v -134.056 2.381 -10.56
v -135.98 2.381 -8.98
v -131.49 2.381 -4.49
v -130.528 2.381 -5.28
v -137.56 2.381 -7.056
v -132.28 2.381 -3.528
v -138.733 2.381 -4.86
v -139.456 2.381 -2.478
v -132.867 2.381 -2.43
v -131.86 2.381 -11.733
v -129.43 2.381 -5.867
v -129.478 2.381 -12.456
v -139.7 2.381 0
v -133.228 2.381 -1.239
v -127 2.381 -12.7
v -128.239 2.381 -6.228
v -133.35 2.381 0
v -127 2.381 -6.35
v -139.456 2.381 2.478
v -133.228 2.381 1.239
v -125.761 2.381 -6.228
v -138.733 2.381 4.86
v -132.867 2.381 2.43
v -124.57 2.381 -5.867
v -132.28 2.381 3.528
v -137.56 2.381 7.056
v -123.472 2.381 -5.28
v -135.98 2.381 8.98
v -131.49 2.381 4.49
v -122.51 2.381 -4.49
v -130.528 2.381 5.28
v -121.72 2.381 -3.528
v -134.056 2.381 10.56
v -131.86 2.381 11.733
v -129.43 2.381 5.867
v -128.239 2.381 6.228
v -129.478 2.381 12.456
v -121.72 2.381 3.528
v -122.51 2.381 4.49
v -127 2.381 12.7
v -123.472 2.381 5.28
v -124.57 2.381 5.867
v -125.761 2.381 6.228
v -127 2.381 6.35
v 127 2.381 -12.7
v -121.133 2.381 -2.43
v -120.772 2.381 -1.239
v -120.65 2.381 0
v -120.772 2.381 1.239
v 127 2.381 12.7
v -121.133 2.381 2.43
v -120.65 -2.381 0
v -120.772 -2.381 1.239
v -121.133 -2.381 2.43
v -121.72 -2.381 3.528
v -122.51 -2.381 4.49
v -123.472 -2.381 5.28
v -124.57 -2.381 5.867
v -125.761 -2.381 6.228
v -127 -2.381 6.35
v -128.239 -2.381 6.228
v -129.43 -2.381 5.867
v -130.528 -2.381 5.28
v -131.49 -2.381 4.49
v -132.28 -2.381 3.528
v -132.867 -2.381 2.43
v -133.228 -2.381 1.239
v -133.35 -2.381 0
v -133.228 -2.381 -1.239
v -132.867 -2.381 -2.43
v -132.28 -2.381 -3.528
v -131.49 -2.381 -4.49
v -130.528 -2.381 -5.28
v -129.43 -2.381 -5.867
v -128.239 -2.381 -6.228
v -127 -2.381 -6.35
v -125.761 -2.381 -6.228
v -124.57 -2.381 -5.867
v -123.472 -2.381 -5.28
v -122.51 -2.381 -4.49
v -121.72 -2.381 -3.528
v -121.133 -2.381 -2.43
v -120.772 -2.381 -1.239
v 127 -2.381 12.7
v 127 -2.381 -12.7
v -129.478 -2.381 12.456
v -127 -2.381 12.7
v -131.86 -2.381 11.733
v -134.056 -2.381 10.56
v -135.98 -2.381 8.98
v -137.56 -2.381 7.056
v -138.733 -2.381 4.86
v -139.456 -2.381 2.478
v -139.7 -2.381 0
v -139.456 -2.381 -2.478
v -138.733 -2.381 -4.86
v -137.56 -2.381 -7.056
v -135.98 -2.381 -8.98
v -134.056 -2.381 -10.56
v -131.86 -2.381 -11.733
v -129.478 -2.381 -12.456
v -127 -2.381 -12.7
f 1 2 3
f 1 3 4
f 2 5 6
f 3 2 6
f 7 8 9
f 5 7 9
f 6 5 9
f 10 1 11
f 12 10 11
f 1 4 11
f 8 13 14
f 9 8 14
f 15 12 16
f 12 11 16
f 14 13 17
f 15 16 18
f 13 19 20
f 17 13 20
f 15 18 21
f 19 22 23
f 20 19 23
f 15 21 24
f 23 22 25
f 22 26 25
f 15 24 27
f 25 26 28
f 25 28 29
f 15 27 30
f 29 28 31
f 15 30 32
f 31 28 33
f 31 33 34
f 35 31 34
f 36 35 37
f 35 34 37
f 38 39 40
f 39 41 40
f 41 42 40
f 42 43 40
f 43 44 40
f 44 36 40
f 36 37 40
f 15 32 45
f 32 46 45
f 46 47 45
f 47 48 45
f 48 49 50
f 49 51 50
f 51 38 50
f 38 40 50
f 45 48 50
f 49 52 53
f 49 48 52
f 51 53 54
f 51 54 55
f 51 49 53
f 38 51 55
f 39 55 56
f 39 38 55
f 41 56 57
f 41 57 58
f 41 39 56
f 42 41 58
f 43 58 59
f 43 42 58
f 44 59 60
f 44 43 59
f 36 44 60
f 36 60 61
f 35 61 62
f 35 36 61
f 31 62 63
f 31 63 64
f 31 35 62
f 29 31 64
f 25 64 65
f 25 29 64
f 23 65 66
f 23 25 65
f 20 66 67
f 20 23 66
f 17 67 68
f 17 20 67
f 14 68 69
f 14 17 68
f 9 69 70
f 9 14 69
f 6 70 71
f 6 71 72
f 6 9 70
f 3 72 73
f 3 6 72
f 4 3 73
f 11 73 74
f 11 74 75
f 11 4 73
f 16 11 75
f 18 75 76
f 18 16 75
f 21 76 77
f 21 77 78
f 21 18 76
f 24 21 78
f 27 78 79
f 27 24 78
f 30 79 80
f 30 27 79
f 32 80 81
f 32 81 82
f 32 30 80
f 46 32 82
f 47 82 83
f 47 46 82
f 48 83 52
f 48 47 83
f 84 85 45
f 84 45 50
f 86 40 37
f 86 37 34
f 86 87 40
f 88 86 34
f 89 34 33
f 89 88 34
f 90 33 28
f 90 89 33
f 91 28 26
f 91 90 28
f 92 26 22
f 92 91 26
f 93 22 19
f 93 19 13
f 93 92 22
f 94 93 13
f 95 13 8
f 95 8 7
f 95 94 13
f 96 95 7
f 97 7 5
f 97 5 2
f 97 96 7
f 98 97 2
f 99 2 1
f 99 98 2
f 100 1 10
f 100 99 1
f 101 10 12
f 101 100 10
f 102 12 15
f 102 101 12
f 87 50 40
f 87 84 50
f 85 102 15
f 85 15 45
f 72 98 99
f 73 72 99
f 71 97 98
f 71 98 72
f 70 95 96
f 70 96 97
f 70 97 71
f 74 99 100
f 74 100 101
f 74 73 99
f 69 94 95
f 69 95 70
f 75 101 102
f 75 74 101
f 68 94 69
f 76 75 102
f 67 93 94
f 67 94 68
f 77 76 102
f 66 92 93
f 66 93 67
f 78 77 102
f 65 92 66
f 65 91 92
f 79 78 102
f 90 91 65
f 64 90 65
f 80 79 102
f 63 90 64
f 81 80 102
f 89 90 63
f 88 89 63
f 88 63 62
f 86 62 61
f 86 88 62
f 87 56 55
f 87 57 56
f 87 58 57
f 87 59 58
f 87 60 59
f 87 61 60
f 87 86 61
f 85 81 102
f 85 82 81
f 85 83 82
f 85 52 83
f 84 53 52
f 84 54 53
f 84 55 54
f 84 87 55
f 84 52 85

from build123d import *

# Parameters (mm, degrees)
F0_R     = 6.35
F1_DEPTH = 2.38125


with BuildPart() as f1:
    # F0 (on Front) → F1 (new body, symmetric)
    with BuildSketch(Plane.XZ):
        with BuildLine():
            ThreePointArc((-127, 12.7), (-139.7, 0), (-127, -12.7))
            Line((-127, -12.7), (127, -12.7))
            Line((127, -12.7), (127, 12.7))
            Line((127, 12.7), (-127, 12.7))
        make_face()
        with Locations((-127, 0)):
            Circle(F0_R, mode=Mode.SUBTRACT)
    extrude(amount=F1_DEPTH, both=True)


solid = f1.part
